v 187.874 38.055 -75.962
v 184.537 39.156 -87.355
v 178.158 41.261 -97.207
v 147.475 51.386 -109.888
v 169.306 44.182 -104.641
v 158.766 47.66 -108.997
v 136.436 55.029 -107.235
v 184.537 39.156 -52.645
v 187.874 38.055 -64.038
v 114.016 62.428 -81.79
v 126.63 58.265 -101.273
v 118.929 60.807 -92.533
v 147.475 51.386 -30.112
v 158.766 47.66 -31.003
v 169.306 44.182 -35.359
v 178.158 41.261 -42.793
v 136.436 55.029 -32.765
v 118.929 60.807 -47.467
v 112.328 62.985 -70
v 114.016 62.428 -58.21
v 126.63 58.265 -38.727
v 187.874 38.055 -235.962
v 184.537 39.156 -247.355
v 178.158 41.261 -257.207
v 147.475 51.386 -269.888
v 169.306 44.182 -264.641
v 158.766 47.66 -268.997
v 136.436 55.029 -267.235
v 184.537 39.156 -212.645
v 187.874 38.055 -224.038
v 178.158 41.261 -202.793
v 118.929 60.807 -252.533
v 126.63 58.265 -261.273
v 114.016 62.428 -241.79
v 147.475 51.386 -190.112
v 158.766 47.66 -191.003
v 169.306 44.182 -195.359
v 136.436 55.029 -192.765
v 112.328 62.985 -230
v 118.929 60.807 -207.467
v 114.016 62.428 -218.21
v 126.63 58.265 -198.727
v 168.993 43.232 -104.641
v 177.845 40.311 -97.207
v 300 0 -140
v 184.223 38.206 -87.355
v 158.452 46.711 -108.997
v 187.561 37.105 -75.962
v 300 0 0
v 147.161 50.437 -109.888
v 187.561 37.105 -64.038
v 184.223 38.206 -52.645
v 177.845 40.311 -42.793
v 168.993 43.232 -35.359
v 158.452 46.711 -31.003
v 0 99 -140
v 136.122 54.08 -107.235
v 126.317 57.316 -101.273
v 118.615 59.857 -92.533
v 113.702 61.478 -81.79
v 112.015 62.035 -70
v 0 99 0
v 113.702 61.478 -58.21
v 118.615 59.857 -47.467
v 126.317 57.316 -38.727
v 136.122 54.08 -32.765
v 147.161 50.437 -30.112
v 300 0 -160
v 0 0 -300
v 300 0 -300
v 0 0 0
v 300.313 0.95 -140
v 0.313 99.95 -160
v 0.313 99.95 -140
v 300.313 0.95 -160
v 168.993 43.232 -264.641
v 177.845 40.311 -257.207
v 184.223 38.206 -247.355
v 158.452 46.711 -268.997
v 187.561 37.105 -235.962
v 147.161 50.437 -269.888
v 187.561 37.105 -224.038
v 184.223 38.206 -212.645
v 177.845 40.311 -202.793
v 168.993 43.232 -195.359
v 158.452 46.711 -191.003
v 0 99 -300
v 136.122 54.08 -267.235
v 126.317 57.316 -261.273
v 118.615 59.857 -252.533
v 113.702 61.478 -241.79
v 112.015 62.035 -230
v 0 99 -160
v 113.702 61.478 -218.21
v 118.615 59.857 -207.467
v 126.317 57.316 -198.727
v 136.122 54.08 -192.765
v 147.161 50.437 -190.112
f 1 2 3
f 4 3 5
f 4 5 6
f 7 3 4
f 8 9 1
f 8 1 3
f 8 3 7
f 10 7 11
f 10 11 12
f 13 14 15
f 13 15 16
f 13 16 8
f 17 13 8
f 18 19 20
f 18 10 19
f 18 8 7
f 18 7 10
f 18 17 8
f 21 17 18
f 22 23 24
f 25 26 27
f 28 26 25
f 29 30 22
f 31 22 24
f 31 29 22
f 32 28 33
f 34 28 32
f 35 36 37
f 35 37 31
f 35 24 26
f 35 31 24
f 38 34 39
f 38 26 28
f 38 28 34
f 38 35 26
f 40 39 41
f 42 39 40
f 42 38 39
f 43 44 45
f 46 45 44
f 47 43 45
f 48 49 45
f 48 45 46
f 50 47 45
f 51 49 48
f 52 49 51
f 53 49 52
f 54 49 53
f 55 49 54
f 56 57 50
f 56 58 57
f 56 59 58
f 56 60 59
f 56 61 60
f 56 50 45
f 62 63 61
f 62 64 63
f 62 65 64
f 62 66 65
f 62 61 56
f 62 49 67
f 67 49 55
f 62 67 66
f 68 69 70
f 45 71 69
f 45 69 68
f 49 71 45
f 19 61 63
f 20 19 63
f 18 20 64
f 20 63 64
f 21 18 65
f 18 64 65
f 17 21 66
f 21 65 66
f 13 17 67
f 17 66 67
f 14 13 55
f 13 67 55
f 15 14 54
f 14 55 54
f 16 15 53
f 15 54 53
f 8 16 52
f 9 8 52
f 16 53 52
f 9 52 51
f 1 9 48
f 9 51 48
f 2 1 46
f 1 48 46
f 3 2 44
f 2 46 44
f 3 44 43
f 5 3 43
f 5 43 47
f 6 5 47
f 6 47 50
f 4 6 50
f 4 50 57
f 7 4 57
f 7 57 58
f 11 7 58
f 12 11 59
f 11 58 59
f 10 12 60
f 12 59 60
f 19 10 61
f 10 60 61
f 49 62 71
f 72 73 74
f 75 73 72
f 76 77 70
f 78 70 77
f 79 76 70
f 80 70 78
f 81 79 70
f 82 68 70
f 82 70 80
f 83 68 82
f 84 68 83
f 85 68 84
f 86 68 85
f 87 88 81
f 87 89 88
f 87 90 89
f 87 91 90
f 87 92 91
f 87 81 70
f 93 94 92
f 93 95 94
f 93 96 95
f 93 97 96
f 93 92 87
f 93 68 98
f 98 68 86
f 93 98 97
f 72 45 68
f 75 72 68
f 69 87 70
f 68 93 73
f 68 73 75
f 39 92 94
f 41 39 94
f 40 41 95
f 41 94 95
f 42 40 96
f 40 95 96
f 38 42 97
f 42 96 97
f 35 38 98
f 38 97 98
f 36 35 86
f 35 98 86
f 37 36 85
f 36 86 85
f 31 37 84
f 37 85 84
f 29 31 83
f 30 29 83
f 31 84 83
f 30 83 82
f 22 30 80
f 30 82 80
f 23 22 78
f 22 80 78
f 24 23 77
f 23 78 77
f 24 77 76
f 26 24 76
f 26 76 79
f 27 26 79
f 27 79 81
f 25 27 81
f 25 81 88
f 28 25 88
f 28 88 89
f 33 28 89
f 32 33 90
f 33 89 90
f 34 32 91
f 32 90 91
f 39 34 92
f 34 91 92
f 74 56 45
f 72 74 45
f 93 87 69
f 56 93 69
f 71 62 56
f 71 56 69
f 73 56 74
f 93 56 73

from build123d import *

# Parameters (mm, degrees)
EXTRUDE_1_DEPTH = 300
SKETCH_3_W      = 315.912962697
SKETCH_3_H      = 20
EXTRUDE_2_DEPTH = 1
SKETCH_5_R      = 40
EXTRUDE_3_DEPTH = 1
SKETCH_6_R      = 40
EXTRUDE_4_DEPTH = 1


with BuildPart() as part:
    # Эскиз1 → Бобышка-Вытянуть1 (new body)
    with BuildSketch(Plane.XY):
        Polygon((0, 0), (300, 0), (0, 99), align=None)
    extrude(amount=-EXTRUDE_1_DEPTH)

    # Эскиз3 → Бобышка-Вытянуть2 (add)
    with BuildSketch(Plane(origin=(29.461628641, 89.277662548, 0), x_dir=(0.9496286491027329, -0.3133774542039019, 0), z_dir=(0.3133774542039019, 0.9496286491027329, 0))):
        with Locations((126.932113383, 150)):
            Rectangle(SKETCH_3_W, SKETCH_3_H)
    extrude(amount=EXTRUDE_2_DEPTH)

    # Эскиз5 → Бобышка-Вытянуть3 (add)
    with BuildSketch(Plane(origin=(29.461628641, 89.277662548, 0), x_dir=(0.9496286491027329, -0.3133774542039019, 0), z_dir=(0.3133774542039019, 0.9496286491027329, 0))):
        with Locations((126.932113382, 70)):
            Circle(SKETCH_5_R)
    extrude(amount=EXTRUDE_3_DEPTH)

    # Эскиз6 → Бобышка-Вытянуть4 (add)
    with BuildSketch(Plane(origin=(29.461628641, 89.277662548, 0), x_dir=(0.9496286491027329, -0.3133774542039019, 0), z_dir=(0.3133774542039019, 0.9496286491027329, 0))):
        with Locations((126.932113382, 230)):
            Circle(SKETCH_6_R)
    extrude(amount=EXTRUDE_4_DEPTH)


solid = part.part
